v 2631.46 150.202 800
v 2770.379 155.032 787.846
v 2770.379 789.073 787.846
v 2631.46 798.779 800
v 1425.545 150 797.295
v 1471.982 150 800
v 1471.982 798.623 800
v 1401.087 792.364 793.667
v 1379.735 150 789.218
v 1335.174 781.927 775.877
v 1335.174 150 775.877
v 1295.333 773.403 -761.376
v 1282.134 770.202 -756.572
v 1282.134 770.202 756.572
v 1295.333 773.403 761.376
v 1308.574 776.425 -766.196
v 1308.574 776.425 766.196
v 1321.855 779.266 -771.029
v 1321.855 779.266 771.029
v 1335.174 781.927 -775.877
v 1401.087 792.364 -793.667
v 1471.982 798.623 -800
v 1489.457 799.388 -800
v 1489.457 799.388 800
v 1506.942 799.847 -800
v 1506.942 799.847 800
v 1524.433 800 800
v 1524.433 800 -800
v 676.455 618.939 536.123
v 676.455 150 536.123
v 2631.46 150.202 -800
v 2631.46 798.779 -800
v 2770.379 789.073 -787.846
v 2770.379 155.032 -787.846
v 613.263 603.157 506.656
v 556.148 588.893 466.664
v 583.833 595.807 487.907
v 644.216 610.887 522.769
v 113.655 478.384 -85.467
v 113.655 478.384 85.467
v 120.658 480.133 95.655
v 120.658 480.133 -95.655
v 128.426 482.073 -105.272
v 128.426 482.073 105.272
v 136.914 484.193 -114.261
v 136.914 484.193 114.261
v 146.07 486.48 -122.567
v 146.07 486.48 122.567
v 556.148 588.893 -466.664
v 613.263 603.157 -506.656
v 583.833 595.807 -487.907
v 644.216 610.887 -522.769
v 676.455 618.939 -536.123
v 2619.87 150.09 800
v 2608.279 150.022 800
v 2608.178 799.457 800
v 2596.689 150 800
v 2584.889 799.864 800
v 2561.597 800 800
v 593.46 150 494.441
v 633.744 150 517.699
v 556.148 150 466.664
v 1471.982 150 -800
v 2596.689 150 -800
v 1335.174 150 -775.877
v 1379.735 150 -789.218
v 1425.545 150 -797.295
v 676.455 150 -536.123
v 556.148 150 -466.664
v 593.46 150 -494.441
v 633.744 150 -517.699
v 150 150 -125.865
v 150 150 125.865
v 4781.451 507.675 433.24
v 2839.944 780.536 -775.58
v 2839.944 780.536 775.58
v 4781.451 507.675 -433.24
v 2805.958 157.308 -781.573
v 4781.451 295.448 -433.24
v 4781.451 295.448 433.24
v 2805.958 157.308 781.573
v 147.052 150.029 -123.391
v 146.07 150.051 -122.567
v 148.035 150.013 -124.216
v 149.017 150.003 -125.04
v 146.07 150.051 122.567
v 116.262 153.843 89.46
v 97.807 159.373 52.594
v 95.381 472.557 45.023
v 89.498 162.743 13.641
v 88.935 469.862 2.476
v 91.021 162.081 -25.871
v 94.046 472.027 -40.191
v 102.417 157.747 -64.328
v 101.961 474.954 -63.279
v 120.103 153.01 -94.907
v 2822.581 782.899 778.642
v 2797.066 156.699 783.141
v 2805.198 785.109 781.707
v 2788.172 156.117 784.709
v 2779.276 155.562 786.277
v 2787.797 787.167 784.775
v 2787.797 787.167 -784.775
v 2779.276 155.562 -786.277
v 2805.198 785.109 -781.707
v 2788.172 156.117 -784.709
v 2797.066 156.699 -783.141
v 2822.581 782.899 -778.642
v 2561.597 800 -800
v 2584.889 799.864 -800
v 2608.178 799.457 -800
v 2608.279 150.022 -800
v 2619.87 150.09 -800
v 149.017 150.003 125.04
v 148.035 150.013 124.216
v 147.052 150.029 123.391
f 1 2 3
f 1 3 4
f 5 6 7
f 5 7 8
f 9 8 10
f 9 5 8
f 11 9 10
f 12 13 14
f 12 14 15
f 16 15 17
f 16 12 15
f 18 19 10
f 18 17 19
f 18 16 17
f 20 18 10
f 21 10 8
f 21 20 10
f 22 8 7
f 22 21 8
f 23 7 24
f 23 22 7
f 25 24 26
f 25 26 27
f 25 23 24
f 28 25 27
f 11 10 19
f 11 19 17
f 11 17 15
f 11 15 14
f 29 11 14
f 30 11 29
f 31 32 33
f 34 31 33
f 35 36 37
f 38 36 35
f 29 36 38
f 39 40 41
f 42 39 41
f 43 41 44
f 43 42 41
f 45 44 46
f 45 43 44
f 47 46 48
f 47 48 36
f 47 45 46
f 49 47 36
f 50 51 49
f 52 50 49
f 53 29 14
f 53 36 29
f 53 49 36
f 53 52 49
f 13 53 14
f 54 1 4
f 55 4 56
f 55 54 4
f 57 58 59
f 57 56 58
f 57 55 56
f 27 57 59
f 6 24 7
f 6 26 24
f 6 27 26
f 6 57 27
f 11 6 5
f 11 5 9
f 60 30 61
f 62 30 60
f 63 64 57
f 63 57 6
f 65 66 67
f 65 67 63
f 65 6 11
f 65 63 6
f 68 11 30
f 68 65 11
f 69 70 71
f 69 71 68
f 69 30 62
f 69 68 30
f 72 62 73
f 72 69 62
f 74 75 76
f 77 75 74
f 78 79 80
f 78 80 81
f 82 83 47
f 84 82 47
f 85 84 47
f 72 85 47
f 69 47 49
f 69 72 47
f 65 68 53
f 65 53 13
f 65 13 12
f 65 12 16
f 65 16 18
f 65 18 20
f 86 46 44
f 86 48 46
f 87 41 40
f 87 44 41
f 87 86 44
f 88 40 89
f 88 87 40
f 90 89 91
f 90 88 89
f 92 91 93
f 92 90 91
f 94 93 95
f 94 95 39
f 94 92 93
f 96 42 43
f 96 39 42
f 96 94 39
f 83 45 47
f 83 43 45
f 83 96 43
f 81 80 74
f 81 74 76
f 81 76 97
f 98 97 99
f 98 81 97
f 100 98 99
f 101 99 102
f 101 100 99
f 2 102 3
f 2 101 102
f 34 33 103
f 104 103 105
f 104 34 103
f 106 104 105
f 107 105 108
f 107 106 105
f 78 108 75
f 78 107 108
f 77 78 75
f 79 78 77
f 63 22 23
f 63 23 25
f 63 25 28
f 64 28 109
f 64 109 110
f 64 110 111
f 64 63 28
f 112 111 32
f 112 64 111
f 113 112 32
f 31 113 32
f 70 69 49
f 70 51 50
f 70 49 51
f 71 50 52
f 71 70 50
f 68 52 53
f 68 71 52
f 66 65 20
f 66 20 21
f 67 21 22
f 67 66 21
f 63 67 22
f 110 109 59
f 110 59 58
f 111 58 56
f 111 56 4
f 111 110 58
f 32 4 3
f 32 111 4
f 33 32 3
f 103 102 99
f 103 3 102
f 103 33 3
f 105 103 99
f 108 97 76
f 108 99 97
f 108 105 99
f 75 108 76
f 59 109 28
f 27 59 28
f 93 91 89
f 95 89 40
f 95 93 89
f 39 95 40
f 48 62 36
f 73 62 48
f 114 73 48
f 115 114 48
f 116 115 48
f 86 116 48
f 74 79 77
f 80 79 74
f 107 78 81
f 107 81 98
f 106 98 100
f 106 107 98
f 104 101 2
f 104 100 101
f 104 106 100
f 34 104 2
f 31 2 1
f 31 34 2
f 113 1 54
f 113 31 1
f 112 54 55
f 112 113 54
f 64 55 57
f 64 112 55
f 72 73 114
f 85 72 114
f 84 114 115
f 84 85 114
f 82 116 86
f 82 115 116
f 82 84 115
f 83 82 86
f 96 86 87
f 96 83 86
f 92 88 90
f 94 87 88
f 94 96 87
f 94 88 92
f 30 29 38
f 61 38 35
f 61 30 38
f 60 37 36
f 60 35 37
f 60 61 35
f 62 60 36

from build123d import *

# Parameters (mm, degrees)
TOPVIEW_EXTRUDE_DEPTH      = 800
SIDEPROFILE_CUT_DEPTH      = 4914.47877429
SIDEPROFILE_CUT_DEPTH_BACK = 4914.47877429
SKETCH2_OUTSIDE_W          = 5698.923
SKETCH2_OUTSIDE_H          = 1806.388


with BuildPart() as part:
    # Sketch1 → TopView_Extrude (new body)
    with BuildSketch(Plane(origin=(0, 0, 0), x_dir=(1, 0, 0), z_dir=(0, 1, 0))):
        with BuildLine():
            Line((146.069849076, 122.567124227), (556.148324977, 466.663731547))
            ThreePointArc((556.148324977, 466.663731547), (613.263316637, 506.656075273), (676.455195963, 536.122941687))
            Line((676.455195963, 536.122941687), (1335.173700718, 775.877020708))
            ThreePointArc((1335.173700718, 775.877020708), (1402.522523085, 793.923094197), (1471.981833896, 800))
            Line((1471.981833896, 800), (2631.460091708, 800))
            ThreePointArc((2631.460091708, 800), (2701.184663634, 796.955760422), (2770.378589806, 787.846210174))
            Line((2770.378589806, 787.846210174), (4781.451, 433.24))
            Line((4781.451, 433.24), (4781.451, -433.24))
            Line((4781.451, -433.24), (2770.378589806, -787.846210174))
            ThreePointArc((2770.378589806, -787.846210174), (2701.184663634, -796.955760422), (2631.460091708, -800))
            Line((2631.460091708, -800), (1471.981833896, -800))
            ThreePointArc((1471.981833896, -800), (1402.522523085, -793.923094197), (1335.173700718, -775.877020708))
            Line((1335.173700718, -775.877020708), (676.455195963, -536.122941687))
            ThreePointArc((676.455195963, -536.122941687), (613.263316637, -506.656075273), (556.148324977, -466.663731547))
            Line((556.148324977, -466.663731547), (146.069849076, -122.567124227))
            ThreePointArc((146.069849076, -122.567124227), (88.915850742, 0), (146.069849076, 122.567124227))
        make_face()
    extrude(amount=TOPVIEW_EXTRUDE_DEPTH)

    # Sketch2 outside → SideProfile_Cut (cut, two sides: drawn at the far end of the back side and taken through both)
    with BuildSketch(Plane.XY.offset(-SIDEPROFILE_CUT_DEPTH_BACK)):
        with Locations((2435.1835, 400)):
            Rectangle(SKETCH2_OUTSIDE_W, SKETCH2_OUTSIDE_H)
        with BuildLine():
            Line((0, 300), (0, 332.854125267))
            ThreePointArc((0, 332.854125267), (31.780430043, 425.180358155), (113.65511039, 478.384359237))
            Line((113.65511039, 478.384359237), (1282.133703367, 770.201559797))
            ThreePointArc((1282.133703367, 770.201559797), (1402.370605908, 792.522432945), (1524.432967436, 800))
            Line((1524.432967436, 800), (2561.597345878, 800))
            ThreePointArc((2561.597345878, 800), (2701.110323381, 795.128098421), (2839.943607388, 780.536129108))
            Line((2839.943607388, 780.536129108), (4781.451, 507.675))
            Line((4781.451, 507.675), (4781.451, 295.448))
            Line((4781.451, 295.448), (2805.958277636, 157.307872364))
            ThreePointArc((2805.958277636, 157.307872364), (2701.387181329, 151.827524732), (2596.688525433, 150))
            Line((2596.688525433, 150), (150, 150))
            ThreePointArc((150, 150), (43.933982822, 193.933982822), (0, 300))
        make_face(mode=Mode.SUBTRACT)
    extrude(amount=SIDEPROFILE_CUT_DEPTH + SIDEPROFILE_CUT_DEPTH_BACK, mode=Mode.SUBTRACT)


solid = part.part
